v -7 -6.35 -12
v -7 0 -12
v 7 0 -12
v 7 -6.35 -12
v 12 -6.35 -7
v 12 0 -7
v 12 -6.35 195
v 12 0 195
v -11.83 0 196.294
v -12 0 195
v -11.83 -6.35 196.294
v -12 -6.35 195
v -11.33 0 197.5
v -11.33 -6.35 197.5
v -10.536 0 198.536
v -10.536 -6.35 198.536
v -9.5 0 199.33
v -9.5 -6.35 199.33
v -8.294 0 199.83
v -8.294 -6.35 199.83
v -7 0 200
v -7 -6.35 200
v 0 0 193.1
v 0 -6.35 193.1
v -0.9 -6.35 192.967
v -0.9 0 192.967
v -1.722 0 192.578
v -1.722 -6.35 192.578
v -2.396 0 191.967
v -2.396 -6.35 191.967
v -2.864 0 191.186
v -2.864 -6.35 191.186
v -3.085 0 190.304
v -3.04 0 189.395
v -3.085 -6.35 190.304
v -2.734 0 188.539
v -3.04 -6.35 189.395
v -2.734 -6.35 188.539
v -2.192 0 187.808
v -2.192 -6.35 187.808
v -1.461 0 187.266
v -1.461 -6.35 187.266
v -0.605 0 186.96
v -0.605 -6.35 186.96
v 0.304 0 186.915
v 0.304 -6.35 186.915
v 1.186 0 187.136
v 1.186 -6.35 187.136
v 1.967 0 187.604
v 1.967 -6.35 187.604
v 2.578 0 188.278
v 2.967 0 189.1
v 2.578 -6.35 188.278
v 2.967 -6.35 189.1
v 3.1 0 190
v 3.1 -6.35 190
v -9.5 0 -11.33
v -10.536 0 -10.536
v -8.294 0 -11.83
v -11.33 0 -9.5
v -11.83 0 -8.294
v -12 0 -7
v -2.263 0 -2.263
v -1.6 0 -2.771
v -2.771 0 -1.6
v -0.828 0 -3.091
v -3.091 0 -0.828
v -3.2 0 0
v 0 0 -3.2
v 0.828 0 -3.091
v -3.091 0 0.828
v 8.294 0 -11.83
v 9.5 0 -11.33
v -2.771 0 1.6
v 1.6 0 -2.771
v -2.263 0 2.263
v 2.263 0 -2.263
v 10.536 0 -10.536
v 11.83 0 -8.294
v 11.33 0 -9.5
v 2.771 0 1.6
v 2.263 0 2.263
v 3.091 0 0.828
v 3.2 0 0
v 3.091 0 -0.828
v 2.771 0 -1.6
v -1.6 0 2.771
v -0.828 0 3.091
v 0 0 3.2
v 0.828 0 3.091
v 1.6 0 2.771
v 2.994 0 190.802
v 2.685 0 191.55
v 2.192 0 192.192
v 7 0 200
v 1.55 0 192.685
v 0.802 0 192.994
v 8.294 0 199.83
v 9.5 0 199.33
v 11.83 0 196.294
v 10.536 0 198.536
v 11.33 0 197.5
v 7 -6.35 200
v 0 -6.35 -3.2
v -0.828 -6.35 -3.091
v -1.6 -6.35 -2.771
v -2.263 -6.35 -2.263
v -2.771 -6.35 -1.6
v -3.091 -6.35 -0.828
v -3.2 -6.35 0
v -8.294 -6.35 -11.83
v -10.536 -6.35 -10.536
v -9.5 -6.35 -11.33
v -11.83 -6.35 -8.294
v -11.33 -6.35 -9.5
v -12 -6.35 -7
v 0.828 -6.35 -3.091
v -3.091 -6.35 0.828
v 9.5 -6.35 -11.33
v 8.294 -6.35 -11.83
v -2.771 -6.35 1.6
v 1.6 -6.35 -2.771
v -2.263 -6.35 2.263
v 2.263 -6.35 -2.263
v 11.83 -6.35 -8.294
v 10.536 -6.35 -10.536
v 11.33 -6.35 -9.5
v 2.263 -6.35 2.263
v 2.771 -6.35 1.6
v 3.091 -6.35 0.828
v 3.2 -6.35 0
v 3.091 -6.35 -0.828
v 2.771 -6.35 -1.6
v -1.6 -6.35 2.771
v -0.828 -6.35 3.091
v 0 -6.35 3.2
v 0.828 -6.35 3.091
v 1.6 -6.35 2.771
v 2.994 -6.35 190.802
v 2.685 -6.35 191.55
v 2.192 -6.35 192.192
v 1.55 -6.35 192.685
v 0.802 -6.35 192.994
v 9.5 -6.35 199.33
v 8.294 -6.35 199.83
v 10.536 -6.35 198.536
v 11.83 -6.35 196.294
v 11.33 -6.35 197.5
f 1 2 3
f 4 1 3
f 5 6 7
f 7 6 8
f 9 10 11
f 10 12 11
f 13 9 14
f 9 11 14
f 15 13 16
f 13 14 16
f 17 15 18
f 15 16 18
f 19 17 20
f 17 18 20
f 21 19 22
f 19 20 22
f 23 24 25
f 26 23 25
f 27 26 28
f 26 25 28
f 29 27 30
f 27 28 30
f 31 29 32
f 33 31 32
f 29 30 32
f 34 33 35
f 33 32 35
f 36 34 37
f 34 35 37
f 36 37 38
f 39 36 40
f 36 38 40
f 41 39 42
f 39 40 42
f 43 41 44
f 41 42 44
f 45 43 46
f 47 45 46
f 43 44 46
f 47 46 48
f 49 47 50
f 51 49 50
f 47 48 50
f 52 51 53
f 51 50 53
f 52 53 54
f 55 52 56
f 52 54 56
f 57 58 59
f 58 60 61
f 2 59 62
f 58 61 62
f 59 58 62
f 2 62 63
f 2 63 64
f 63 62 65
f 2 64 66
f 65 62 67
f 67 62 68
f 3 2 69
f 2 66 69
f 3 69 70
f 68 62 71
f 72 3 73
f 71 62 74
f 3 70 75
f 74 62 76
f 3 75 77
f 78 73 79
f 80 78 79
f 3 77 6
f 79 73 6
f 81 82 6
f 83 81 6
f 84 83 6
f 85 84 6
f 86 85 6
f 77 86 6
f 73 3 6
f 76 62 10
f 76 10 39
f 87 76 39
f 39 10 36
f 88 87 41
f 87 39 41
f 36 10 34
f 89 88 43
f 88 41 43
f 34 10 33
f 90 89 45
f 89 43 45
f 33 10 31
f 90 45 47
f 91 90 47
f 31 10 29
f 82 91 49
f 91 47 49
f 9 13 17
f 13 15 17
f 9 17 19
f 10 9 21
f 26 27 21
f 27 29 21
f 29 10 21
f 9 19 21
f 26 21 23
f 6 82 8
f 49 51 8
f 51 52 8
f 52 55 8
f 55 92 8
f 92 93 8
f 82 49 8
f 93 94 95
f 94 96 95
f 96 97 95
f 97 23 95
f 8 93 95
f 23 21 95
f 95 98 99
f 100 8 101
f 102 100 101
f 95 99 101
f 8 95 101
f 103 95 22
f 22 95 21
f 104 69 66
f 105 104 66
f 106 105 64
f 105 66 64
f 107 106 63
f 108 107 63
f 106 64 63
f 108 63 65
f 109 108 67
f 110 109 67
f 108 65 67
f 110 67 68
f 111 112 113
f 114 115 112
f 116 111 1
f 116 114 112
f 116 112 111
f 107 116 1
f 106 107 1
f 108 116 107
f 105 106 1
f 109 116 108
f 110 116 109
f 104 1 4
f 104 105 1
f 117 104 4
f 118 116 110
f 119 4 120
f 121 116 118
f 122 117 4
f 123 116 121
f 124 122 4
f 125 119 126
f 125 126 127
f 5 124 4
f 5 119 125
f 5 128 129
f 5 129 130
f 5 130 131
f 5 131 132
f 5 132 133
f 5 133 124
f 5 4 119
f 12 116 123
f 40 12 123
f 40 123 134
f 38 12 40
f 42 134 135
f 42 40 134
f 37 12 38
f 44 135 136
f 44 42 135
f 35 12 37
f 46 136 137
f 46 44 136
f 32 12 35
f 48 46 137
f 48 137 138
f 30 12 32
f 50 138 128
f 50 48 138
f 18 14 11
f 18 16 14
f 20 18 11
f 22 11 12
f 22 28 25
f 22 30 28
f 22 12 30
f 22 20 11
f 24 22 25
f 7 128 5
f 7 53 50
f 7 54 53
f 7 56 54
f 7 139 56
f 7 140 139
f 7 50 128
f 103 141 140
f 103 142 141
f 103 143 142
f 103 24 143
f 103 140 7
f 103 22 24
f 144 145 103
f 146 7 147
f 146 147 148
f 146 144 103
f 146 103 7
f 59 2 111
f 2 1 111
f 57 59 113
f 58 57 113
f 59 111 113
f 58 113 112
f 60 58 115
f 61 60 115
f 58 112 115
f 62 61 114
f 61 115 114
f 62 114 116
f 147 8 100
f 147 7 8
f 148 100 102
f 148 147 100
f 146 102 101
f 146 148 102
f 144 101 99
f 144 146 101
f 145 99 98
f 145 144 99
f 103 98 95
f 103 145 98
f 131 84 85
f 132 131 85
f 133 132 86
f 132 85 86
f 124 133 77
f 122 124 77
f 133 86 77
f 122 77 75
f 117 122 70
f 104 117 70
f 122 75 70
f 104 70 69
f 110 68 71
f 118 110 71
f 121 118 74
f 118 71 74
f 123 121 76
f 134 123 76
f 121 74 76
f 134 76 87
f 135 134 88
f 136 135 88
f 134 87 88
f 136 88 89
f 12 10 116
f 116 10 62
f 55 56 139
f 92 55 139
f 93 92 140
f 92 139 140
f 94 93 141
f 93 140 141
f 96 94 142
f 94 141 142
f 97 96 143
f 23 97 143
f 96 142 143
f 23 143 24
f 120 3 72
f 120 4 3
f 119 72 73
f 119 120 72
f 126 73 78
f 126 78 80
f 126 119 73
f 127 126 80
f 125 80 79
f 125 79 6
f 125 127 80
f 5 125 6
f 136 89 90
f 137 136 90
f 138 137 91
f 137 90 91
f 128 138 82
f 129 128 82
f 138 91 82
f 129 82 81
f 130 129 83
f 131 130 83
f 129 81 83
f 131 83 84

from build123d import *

# Parameters (mm, degrees)
F1_DEPTH = 6.35
F3_DEPTH = 25
F4_R     = 5


with BuildPart() as f1:
    # F0 (on Front) → F1 (new body)
    with BuildSketch(Plane.XZ):
        with BuildLine():
            Line((0, -12), (0, -3.2))
            ThreePointArc((0, -3.2), (-2.262742, -2.262742), (-3.2, 0))
            Line((-3.2, 0), (-12, 0))
            Line((-12, 0), (-12, -12))
            Line((-12, -12), (0, -12))
        make_face()
        with BuildLine():
            ThreePointArc((0, 3.2), (2.262742, 2.262742), (3.2, 0))
            ThreePointArc((3.2, 0), (2.262742, -2.262742), (0, -3.2))
            Line((0, -3.2), (0, -12))
            Line((0, -12), (12, -12))
            Line((12, -12), (12, 200))
            Line((12, 200), (0, 200))
            Line((0, 200), (0, 3.2))
        make_face()
        with BuildLine():
            ThreePointArc((-3.2, 0), (-2.262742, 2.262742), (0, 3.2))
            Line((0, 3.2), (0, 200))
            Line((0, 200), (-12, 200))
            Line((-12, 200), (-12, 0))
            Line((-12, 0), (-3.2, 0))
        make_face()
    extrude(amount=F1_DEPTH)

    # F2 (on face) → F3 (cut)
    with BuildSketch(Plane.XZ.offset(6.35)):
        with BuildLine():
            ThreePointArc((0, 193.1), (-2.192031, 187.807969), (3.1, 190))
            ThreePointArc((3.1, 190), (2.192031, 192.192031), (0, 193.1))
        make_face()
    extrude(amount=-F3_DEPTH, mode=Mode.SUBTRACT)

    # F4
    f4_edges = [f1.edges().sort_by_distance(p)[0] for p in [
        (12, -3.175, 200),
        (-12, -3.175, 200),
        (12, -3.175, -12),
        (-12, -3.175, -12),
    ]]
    fillet(f4_edges, radius=F4_R)


solid = f1.part
